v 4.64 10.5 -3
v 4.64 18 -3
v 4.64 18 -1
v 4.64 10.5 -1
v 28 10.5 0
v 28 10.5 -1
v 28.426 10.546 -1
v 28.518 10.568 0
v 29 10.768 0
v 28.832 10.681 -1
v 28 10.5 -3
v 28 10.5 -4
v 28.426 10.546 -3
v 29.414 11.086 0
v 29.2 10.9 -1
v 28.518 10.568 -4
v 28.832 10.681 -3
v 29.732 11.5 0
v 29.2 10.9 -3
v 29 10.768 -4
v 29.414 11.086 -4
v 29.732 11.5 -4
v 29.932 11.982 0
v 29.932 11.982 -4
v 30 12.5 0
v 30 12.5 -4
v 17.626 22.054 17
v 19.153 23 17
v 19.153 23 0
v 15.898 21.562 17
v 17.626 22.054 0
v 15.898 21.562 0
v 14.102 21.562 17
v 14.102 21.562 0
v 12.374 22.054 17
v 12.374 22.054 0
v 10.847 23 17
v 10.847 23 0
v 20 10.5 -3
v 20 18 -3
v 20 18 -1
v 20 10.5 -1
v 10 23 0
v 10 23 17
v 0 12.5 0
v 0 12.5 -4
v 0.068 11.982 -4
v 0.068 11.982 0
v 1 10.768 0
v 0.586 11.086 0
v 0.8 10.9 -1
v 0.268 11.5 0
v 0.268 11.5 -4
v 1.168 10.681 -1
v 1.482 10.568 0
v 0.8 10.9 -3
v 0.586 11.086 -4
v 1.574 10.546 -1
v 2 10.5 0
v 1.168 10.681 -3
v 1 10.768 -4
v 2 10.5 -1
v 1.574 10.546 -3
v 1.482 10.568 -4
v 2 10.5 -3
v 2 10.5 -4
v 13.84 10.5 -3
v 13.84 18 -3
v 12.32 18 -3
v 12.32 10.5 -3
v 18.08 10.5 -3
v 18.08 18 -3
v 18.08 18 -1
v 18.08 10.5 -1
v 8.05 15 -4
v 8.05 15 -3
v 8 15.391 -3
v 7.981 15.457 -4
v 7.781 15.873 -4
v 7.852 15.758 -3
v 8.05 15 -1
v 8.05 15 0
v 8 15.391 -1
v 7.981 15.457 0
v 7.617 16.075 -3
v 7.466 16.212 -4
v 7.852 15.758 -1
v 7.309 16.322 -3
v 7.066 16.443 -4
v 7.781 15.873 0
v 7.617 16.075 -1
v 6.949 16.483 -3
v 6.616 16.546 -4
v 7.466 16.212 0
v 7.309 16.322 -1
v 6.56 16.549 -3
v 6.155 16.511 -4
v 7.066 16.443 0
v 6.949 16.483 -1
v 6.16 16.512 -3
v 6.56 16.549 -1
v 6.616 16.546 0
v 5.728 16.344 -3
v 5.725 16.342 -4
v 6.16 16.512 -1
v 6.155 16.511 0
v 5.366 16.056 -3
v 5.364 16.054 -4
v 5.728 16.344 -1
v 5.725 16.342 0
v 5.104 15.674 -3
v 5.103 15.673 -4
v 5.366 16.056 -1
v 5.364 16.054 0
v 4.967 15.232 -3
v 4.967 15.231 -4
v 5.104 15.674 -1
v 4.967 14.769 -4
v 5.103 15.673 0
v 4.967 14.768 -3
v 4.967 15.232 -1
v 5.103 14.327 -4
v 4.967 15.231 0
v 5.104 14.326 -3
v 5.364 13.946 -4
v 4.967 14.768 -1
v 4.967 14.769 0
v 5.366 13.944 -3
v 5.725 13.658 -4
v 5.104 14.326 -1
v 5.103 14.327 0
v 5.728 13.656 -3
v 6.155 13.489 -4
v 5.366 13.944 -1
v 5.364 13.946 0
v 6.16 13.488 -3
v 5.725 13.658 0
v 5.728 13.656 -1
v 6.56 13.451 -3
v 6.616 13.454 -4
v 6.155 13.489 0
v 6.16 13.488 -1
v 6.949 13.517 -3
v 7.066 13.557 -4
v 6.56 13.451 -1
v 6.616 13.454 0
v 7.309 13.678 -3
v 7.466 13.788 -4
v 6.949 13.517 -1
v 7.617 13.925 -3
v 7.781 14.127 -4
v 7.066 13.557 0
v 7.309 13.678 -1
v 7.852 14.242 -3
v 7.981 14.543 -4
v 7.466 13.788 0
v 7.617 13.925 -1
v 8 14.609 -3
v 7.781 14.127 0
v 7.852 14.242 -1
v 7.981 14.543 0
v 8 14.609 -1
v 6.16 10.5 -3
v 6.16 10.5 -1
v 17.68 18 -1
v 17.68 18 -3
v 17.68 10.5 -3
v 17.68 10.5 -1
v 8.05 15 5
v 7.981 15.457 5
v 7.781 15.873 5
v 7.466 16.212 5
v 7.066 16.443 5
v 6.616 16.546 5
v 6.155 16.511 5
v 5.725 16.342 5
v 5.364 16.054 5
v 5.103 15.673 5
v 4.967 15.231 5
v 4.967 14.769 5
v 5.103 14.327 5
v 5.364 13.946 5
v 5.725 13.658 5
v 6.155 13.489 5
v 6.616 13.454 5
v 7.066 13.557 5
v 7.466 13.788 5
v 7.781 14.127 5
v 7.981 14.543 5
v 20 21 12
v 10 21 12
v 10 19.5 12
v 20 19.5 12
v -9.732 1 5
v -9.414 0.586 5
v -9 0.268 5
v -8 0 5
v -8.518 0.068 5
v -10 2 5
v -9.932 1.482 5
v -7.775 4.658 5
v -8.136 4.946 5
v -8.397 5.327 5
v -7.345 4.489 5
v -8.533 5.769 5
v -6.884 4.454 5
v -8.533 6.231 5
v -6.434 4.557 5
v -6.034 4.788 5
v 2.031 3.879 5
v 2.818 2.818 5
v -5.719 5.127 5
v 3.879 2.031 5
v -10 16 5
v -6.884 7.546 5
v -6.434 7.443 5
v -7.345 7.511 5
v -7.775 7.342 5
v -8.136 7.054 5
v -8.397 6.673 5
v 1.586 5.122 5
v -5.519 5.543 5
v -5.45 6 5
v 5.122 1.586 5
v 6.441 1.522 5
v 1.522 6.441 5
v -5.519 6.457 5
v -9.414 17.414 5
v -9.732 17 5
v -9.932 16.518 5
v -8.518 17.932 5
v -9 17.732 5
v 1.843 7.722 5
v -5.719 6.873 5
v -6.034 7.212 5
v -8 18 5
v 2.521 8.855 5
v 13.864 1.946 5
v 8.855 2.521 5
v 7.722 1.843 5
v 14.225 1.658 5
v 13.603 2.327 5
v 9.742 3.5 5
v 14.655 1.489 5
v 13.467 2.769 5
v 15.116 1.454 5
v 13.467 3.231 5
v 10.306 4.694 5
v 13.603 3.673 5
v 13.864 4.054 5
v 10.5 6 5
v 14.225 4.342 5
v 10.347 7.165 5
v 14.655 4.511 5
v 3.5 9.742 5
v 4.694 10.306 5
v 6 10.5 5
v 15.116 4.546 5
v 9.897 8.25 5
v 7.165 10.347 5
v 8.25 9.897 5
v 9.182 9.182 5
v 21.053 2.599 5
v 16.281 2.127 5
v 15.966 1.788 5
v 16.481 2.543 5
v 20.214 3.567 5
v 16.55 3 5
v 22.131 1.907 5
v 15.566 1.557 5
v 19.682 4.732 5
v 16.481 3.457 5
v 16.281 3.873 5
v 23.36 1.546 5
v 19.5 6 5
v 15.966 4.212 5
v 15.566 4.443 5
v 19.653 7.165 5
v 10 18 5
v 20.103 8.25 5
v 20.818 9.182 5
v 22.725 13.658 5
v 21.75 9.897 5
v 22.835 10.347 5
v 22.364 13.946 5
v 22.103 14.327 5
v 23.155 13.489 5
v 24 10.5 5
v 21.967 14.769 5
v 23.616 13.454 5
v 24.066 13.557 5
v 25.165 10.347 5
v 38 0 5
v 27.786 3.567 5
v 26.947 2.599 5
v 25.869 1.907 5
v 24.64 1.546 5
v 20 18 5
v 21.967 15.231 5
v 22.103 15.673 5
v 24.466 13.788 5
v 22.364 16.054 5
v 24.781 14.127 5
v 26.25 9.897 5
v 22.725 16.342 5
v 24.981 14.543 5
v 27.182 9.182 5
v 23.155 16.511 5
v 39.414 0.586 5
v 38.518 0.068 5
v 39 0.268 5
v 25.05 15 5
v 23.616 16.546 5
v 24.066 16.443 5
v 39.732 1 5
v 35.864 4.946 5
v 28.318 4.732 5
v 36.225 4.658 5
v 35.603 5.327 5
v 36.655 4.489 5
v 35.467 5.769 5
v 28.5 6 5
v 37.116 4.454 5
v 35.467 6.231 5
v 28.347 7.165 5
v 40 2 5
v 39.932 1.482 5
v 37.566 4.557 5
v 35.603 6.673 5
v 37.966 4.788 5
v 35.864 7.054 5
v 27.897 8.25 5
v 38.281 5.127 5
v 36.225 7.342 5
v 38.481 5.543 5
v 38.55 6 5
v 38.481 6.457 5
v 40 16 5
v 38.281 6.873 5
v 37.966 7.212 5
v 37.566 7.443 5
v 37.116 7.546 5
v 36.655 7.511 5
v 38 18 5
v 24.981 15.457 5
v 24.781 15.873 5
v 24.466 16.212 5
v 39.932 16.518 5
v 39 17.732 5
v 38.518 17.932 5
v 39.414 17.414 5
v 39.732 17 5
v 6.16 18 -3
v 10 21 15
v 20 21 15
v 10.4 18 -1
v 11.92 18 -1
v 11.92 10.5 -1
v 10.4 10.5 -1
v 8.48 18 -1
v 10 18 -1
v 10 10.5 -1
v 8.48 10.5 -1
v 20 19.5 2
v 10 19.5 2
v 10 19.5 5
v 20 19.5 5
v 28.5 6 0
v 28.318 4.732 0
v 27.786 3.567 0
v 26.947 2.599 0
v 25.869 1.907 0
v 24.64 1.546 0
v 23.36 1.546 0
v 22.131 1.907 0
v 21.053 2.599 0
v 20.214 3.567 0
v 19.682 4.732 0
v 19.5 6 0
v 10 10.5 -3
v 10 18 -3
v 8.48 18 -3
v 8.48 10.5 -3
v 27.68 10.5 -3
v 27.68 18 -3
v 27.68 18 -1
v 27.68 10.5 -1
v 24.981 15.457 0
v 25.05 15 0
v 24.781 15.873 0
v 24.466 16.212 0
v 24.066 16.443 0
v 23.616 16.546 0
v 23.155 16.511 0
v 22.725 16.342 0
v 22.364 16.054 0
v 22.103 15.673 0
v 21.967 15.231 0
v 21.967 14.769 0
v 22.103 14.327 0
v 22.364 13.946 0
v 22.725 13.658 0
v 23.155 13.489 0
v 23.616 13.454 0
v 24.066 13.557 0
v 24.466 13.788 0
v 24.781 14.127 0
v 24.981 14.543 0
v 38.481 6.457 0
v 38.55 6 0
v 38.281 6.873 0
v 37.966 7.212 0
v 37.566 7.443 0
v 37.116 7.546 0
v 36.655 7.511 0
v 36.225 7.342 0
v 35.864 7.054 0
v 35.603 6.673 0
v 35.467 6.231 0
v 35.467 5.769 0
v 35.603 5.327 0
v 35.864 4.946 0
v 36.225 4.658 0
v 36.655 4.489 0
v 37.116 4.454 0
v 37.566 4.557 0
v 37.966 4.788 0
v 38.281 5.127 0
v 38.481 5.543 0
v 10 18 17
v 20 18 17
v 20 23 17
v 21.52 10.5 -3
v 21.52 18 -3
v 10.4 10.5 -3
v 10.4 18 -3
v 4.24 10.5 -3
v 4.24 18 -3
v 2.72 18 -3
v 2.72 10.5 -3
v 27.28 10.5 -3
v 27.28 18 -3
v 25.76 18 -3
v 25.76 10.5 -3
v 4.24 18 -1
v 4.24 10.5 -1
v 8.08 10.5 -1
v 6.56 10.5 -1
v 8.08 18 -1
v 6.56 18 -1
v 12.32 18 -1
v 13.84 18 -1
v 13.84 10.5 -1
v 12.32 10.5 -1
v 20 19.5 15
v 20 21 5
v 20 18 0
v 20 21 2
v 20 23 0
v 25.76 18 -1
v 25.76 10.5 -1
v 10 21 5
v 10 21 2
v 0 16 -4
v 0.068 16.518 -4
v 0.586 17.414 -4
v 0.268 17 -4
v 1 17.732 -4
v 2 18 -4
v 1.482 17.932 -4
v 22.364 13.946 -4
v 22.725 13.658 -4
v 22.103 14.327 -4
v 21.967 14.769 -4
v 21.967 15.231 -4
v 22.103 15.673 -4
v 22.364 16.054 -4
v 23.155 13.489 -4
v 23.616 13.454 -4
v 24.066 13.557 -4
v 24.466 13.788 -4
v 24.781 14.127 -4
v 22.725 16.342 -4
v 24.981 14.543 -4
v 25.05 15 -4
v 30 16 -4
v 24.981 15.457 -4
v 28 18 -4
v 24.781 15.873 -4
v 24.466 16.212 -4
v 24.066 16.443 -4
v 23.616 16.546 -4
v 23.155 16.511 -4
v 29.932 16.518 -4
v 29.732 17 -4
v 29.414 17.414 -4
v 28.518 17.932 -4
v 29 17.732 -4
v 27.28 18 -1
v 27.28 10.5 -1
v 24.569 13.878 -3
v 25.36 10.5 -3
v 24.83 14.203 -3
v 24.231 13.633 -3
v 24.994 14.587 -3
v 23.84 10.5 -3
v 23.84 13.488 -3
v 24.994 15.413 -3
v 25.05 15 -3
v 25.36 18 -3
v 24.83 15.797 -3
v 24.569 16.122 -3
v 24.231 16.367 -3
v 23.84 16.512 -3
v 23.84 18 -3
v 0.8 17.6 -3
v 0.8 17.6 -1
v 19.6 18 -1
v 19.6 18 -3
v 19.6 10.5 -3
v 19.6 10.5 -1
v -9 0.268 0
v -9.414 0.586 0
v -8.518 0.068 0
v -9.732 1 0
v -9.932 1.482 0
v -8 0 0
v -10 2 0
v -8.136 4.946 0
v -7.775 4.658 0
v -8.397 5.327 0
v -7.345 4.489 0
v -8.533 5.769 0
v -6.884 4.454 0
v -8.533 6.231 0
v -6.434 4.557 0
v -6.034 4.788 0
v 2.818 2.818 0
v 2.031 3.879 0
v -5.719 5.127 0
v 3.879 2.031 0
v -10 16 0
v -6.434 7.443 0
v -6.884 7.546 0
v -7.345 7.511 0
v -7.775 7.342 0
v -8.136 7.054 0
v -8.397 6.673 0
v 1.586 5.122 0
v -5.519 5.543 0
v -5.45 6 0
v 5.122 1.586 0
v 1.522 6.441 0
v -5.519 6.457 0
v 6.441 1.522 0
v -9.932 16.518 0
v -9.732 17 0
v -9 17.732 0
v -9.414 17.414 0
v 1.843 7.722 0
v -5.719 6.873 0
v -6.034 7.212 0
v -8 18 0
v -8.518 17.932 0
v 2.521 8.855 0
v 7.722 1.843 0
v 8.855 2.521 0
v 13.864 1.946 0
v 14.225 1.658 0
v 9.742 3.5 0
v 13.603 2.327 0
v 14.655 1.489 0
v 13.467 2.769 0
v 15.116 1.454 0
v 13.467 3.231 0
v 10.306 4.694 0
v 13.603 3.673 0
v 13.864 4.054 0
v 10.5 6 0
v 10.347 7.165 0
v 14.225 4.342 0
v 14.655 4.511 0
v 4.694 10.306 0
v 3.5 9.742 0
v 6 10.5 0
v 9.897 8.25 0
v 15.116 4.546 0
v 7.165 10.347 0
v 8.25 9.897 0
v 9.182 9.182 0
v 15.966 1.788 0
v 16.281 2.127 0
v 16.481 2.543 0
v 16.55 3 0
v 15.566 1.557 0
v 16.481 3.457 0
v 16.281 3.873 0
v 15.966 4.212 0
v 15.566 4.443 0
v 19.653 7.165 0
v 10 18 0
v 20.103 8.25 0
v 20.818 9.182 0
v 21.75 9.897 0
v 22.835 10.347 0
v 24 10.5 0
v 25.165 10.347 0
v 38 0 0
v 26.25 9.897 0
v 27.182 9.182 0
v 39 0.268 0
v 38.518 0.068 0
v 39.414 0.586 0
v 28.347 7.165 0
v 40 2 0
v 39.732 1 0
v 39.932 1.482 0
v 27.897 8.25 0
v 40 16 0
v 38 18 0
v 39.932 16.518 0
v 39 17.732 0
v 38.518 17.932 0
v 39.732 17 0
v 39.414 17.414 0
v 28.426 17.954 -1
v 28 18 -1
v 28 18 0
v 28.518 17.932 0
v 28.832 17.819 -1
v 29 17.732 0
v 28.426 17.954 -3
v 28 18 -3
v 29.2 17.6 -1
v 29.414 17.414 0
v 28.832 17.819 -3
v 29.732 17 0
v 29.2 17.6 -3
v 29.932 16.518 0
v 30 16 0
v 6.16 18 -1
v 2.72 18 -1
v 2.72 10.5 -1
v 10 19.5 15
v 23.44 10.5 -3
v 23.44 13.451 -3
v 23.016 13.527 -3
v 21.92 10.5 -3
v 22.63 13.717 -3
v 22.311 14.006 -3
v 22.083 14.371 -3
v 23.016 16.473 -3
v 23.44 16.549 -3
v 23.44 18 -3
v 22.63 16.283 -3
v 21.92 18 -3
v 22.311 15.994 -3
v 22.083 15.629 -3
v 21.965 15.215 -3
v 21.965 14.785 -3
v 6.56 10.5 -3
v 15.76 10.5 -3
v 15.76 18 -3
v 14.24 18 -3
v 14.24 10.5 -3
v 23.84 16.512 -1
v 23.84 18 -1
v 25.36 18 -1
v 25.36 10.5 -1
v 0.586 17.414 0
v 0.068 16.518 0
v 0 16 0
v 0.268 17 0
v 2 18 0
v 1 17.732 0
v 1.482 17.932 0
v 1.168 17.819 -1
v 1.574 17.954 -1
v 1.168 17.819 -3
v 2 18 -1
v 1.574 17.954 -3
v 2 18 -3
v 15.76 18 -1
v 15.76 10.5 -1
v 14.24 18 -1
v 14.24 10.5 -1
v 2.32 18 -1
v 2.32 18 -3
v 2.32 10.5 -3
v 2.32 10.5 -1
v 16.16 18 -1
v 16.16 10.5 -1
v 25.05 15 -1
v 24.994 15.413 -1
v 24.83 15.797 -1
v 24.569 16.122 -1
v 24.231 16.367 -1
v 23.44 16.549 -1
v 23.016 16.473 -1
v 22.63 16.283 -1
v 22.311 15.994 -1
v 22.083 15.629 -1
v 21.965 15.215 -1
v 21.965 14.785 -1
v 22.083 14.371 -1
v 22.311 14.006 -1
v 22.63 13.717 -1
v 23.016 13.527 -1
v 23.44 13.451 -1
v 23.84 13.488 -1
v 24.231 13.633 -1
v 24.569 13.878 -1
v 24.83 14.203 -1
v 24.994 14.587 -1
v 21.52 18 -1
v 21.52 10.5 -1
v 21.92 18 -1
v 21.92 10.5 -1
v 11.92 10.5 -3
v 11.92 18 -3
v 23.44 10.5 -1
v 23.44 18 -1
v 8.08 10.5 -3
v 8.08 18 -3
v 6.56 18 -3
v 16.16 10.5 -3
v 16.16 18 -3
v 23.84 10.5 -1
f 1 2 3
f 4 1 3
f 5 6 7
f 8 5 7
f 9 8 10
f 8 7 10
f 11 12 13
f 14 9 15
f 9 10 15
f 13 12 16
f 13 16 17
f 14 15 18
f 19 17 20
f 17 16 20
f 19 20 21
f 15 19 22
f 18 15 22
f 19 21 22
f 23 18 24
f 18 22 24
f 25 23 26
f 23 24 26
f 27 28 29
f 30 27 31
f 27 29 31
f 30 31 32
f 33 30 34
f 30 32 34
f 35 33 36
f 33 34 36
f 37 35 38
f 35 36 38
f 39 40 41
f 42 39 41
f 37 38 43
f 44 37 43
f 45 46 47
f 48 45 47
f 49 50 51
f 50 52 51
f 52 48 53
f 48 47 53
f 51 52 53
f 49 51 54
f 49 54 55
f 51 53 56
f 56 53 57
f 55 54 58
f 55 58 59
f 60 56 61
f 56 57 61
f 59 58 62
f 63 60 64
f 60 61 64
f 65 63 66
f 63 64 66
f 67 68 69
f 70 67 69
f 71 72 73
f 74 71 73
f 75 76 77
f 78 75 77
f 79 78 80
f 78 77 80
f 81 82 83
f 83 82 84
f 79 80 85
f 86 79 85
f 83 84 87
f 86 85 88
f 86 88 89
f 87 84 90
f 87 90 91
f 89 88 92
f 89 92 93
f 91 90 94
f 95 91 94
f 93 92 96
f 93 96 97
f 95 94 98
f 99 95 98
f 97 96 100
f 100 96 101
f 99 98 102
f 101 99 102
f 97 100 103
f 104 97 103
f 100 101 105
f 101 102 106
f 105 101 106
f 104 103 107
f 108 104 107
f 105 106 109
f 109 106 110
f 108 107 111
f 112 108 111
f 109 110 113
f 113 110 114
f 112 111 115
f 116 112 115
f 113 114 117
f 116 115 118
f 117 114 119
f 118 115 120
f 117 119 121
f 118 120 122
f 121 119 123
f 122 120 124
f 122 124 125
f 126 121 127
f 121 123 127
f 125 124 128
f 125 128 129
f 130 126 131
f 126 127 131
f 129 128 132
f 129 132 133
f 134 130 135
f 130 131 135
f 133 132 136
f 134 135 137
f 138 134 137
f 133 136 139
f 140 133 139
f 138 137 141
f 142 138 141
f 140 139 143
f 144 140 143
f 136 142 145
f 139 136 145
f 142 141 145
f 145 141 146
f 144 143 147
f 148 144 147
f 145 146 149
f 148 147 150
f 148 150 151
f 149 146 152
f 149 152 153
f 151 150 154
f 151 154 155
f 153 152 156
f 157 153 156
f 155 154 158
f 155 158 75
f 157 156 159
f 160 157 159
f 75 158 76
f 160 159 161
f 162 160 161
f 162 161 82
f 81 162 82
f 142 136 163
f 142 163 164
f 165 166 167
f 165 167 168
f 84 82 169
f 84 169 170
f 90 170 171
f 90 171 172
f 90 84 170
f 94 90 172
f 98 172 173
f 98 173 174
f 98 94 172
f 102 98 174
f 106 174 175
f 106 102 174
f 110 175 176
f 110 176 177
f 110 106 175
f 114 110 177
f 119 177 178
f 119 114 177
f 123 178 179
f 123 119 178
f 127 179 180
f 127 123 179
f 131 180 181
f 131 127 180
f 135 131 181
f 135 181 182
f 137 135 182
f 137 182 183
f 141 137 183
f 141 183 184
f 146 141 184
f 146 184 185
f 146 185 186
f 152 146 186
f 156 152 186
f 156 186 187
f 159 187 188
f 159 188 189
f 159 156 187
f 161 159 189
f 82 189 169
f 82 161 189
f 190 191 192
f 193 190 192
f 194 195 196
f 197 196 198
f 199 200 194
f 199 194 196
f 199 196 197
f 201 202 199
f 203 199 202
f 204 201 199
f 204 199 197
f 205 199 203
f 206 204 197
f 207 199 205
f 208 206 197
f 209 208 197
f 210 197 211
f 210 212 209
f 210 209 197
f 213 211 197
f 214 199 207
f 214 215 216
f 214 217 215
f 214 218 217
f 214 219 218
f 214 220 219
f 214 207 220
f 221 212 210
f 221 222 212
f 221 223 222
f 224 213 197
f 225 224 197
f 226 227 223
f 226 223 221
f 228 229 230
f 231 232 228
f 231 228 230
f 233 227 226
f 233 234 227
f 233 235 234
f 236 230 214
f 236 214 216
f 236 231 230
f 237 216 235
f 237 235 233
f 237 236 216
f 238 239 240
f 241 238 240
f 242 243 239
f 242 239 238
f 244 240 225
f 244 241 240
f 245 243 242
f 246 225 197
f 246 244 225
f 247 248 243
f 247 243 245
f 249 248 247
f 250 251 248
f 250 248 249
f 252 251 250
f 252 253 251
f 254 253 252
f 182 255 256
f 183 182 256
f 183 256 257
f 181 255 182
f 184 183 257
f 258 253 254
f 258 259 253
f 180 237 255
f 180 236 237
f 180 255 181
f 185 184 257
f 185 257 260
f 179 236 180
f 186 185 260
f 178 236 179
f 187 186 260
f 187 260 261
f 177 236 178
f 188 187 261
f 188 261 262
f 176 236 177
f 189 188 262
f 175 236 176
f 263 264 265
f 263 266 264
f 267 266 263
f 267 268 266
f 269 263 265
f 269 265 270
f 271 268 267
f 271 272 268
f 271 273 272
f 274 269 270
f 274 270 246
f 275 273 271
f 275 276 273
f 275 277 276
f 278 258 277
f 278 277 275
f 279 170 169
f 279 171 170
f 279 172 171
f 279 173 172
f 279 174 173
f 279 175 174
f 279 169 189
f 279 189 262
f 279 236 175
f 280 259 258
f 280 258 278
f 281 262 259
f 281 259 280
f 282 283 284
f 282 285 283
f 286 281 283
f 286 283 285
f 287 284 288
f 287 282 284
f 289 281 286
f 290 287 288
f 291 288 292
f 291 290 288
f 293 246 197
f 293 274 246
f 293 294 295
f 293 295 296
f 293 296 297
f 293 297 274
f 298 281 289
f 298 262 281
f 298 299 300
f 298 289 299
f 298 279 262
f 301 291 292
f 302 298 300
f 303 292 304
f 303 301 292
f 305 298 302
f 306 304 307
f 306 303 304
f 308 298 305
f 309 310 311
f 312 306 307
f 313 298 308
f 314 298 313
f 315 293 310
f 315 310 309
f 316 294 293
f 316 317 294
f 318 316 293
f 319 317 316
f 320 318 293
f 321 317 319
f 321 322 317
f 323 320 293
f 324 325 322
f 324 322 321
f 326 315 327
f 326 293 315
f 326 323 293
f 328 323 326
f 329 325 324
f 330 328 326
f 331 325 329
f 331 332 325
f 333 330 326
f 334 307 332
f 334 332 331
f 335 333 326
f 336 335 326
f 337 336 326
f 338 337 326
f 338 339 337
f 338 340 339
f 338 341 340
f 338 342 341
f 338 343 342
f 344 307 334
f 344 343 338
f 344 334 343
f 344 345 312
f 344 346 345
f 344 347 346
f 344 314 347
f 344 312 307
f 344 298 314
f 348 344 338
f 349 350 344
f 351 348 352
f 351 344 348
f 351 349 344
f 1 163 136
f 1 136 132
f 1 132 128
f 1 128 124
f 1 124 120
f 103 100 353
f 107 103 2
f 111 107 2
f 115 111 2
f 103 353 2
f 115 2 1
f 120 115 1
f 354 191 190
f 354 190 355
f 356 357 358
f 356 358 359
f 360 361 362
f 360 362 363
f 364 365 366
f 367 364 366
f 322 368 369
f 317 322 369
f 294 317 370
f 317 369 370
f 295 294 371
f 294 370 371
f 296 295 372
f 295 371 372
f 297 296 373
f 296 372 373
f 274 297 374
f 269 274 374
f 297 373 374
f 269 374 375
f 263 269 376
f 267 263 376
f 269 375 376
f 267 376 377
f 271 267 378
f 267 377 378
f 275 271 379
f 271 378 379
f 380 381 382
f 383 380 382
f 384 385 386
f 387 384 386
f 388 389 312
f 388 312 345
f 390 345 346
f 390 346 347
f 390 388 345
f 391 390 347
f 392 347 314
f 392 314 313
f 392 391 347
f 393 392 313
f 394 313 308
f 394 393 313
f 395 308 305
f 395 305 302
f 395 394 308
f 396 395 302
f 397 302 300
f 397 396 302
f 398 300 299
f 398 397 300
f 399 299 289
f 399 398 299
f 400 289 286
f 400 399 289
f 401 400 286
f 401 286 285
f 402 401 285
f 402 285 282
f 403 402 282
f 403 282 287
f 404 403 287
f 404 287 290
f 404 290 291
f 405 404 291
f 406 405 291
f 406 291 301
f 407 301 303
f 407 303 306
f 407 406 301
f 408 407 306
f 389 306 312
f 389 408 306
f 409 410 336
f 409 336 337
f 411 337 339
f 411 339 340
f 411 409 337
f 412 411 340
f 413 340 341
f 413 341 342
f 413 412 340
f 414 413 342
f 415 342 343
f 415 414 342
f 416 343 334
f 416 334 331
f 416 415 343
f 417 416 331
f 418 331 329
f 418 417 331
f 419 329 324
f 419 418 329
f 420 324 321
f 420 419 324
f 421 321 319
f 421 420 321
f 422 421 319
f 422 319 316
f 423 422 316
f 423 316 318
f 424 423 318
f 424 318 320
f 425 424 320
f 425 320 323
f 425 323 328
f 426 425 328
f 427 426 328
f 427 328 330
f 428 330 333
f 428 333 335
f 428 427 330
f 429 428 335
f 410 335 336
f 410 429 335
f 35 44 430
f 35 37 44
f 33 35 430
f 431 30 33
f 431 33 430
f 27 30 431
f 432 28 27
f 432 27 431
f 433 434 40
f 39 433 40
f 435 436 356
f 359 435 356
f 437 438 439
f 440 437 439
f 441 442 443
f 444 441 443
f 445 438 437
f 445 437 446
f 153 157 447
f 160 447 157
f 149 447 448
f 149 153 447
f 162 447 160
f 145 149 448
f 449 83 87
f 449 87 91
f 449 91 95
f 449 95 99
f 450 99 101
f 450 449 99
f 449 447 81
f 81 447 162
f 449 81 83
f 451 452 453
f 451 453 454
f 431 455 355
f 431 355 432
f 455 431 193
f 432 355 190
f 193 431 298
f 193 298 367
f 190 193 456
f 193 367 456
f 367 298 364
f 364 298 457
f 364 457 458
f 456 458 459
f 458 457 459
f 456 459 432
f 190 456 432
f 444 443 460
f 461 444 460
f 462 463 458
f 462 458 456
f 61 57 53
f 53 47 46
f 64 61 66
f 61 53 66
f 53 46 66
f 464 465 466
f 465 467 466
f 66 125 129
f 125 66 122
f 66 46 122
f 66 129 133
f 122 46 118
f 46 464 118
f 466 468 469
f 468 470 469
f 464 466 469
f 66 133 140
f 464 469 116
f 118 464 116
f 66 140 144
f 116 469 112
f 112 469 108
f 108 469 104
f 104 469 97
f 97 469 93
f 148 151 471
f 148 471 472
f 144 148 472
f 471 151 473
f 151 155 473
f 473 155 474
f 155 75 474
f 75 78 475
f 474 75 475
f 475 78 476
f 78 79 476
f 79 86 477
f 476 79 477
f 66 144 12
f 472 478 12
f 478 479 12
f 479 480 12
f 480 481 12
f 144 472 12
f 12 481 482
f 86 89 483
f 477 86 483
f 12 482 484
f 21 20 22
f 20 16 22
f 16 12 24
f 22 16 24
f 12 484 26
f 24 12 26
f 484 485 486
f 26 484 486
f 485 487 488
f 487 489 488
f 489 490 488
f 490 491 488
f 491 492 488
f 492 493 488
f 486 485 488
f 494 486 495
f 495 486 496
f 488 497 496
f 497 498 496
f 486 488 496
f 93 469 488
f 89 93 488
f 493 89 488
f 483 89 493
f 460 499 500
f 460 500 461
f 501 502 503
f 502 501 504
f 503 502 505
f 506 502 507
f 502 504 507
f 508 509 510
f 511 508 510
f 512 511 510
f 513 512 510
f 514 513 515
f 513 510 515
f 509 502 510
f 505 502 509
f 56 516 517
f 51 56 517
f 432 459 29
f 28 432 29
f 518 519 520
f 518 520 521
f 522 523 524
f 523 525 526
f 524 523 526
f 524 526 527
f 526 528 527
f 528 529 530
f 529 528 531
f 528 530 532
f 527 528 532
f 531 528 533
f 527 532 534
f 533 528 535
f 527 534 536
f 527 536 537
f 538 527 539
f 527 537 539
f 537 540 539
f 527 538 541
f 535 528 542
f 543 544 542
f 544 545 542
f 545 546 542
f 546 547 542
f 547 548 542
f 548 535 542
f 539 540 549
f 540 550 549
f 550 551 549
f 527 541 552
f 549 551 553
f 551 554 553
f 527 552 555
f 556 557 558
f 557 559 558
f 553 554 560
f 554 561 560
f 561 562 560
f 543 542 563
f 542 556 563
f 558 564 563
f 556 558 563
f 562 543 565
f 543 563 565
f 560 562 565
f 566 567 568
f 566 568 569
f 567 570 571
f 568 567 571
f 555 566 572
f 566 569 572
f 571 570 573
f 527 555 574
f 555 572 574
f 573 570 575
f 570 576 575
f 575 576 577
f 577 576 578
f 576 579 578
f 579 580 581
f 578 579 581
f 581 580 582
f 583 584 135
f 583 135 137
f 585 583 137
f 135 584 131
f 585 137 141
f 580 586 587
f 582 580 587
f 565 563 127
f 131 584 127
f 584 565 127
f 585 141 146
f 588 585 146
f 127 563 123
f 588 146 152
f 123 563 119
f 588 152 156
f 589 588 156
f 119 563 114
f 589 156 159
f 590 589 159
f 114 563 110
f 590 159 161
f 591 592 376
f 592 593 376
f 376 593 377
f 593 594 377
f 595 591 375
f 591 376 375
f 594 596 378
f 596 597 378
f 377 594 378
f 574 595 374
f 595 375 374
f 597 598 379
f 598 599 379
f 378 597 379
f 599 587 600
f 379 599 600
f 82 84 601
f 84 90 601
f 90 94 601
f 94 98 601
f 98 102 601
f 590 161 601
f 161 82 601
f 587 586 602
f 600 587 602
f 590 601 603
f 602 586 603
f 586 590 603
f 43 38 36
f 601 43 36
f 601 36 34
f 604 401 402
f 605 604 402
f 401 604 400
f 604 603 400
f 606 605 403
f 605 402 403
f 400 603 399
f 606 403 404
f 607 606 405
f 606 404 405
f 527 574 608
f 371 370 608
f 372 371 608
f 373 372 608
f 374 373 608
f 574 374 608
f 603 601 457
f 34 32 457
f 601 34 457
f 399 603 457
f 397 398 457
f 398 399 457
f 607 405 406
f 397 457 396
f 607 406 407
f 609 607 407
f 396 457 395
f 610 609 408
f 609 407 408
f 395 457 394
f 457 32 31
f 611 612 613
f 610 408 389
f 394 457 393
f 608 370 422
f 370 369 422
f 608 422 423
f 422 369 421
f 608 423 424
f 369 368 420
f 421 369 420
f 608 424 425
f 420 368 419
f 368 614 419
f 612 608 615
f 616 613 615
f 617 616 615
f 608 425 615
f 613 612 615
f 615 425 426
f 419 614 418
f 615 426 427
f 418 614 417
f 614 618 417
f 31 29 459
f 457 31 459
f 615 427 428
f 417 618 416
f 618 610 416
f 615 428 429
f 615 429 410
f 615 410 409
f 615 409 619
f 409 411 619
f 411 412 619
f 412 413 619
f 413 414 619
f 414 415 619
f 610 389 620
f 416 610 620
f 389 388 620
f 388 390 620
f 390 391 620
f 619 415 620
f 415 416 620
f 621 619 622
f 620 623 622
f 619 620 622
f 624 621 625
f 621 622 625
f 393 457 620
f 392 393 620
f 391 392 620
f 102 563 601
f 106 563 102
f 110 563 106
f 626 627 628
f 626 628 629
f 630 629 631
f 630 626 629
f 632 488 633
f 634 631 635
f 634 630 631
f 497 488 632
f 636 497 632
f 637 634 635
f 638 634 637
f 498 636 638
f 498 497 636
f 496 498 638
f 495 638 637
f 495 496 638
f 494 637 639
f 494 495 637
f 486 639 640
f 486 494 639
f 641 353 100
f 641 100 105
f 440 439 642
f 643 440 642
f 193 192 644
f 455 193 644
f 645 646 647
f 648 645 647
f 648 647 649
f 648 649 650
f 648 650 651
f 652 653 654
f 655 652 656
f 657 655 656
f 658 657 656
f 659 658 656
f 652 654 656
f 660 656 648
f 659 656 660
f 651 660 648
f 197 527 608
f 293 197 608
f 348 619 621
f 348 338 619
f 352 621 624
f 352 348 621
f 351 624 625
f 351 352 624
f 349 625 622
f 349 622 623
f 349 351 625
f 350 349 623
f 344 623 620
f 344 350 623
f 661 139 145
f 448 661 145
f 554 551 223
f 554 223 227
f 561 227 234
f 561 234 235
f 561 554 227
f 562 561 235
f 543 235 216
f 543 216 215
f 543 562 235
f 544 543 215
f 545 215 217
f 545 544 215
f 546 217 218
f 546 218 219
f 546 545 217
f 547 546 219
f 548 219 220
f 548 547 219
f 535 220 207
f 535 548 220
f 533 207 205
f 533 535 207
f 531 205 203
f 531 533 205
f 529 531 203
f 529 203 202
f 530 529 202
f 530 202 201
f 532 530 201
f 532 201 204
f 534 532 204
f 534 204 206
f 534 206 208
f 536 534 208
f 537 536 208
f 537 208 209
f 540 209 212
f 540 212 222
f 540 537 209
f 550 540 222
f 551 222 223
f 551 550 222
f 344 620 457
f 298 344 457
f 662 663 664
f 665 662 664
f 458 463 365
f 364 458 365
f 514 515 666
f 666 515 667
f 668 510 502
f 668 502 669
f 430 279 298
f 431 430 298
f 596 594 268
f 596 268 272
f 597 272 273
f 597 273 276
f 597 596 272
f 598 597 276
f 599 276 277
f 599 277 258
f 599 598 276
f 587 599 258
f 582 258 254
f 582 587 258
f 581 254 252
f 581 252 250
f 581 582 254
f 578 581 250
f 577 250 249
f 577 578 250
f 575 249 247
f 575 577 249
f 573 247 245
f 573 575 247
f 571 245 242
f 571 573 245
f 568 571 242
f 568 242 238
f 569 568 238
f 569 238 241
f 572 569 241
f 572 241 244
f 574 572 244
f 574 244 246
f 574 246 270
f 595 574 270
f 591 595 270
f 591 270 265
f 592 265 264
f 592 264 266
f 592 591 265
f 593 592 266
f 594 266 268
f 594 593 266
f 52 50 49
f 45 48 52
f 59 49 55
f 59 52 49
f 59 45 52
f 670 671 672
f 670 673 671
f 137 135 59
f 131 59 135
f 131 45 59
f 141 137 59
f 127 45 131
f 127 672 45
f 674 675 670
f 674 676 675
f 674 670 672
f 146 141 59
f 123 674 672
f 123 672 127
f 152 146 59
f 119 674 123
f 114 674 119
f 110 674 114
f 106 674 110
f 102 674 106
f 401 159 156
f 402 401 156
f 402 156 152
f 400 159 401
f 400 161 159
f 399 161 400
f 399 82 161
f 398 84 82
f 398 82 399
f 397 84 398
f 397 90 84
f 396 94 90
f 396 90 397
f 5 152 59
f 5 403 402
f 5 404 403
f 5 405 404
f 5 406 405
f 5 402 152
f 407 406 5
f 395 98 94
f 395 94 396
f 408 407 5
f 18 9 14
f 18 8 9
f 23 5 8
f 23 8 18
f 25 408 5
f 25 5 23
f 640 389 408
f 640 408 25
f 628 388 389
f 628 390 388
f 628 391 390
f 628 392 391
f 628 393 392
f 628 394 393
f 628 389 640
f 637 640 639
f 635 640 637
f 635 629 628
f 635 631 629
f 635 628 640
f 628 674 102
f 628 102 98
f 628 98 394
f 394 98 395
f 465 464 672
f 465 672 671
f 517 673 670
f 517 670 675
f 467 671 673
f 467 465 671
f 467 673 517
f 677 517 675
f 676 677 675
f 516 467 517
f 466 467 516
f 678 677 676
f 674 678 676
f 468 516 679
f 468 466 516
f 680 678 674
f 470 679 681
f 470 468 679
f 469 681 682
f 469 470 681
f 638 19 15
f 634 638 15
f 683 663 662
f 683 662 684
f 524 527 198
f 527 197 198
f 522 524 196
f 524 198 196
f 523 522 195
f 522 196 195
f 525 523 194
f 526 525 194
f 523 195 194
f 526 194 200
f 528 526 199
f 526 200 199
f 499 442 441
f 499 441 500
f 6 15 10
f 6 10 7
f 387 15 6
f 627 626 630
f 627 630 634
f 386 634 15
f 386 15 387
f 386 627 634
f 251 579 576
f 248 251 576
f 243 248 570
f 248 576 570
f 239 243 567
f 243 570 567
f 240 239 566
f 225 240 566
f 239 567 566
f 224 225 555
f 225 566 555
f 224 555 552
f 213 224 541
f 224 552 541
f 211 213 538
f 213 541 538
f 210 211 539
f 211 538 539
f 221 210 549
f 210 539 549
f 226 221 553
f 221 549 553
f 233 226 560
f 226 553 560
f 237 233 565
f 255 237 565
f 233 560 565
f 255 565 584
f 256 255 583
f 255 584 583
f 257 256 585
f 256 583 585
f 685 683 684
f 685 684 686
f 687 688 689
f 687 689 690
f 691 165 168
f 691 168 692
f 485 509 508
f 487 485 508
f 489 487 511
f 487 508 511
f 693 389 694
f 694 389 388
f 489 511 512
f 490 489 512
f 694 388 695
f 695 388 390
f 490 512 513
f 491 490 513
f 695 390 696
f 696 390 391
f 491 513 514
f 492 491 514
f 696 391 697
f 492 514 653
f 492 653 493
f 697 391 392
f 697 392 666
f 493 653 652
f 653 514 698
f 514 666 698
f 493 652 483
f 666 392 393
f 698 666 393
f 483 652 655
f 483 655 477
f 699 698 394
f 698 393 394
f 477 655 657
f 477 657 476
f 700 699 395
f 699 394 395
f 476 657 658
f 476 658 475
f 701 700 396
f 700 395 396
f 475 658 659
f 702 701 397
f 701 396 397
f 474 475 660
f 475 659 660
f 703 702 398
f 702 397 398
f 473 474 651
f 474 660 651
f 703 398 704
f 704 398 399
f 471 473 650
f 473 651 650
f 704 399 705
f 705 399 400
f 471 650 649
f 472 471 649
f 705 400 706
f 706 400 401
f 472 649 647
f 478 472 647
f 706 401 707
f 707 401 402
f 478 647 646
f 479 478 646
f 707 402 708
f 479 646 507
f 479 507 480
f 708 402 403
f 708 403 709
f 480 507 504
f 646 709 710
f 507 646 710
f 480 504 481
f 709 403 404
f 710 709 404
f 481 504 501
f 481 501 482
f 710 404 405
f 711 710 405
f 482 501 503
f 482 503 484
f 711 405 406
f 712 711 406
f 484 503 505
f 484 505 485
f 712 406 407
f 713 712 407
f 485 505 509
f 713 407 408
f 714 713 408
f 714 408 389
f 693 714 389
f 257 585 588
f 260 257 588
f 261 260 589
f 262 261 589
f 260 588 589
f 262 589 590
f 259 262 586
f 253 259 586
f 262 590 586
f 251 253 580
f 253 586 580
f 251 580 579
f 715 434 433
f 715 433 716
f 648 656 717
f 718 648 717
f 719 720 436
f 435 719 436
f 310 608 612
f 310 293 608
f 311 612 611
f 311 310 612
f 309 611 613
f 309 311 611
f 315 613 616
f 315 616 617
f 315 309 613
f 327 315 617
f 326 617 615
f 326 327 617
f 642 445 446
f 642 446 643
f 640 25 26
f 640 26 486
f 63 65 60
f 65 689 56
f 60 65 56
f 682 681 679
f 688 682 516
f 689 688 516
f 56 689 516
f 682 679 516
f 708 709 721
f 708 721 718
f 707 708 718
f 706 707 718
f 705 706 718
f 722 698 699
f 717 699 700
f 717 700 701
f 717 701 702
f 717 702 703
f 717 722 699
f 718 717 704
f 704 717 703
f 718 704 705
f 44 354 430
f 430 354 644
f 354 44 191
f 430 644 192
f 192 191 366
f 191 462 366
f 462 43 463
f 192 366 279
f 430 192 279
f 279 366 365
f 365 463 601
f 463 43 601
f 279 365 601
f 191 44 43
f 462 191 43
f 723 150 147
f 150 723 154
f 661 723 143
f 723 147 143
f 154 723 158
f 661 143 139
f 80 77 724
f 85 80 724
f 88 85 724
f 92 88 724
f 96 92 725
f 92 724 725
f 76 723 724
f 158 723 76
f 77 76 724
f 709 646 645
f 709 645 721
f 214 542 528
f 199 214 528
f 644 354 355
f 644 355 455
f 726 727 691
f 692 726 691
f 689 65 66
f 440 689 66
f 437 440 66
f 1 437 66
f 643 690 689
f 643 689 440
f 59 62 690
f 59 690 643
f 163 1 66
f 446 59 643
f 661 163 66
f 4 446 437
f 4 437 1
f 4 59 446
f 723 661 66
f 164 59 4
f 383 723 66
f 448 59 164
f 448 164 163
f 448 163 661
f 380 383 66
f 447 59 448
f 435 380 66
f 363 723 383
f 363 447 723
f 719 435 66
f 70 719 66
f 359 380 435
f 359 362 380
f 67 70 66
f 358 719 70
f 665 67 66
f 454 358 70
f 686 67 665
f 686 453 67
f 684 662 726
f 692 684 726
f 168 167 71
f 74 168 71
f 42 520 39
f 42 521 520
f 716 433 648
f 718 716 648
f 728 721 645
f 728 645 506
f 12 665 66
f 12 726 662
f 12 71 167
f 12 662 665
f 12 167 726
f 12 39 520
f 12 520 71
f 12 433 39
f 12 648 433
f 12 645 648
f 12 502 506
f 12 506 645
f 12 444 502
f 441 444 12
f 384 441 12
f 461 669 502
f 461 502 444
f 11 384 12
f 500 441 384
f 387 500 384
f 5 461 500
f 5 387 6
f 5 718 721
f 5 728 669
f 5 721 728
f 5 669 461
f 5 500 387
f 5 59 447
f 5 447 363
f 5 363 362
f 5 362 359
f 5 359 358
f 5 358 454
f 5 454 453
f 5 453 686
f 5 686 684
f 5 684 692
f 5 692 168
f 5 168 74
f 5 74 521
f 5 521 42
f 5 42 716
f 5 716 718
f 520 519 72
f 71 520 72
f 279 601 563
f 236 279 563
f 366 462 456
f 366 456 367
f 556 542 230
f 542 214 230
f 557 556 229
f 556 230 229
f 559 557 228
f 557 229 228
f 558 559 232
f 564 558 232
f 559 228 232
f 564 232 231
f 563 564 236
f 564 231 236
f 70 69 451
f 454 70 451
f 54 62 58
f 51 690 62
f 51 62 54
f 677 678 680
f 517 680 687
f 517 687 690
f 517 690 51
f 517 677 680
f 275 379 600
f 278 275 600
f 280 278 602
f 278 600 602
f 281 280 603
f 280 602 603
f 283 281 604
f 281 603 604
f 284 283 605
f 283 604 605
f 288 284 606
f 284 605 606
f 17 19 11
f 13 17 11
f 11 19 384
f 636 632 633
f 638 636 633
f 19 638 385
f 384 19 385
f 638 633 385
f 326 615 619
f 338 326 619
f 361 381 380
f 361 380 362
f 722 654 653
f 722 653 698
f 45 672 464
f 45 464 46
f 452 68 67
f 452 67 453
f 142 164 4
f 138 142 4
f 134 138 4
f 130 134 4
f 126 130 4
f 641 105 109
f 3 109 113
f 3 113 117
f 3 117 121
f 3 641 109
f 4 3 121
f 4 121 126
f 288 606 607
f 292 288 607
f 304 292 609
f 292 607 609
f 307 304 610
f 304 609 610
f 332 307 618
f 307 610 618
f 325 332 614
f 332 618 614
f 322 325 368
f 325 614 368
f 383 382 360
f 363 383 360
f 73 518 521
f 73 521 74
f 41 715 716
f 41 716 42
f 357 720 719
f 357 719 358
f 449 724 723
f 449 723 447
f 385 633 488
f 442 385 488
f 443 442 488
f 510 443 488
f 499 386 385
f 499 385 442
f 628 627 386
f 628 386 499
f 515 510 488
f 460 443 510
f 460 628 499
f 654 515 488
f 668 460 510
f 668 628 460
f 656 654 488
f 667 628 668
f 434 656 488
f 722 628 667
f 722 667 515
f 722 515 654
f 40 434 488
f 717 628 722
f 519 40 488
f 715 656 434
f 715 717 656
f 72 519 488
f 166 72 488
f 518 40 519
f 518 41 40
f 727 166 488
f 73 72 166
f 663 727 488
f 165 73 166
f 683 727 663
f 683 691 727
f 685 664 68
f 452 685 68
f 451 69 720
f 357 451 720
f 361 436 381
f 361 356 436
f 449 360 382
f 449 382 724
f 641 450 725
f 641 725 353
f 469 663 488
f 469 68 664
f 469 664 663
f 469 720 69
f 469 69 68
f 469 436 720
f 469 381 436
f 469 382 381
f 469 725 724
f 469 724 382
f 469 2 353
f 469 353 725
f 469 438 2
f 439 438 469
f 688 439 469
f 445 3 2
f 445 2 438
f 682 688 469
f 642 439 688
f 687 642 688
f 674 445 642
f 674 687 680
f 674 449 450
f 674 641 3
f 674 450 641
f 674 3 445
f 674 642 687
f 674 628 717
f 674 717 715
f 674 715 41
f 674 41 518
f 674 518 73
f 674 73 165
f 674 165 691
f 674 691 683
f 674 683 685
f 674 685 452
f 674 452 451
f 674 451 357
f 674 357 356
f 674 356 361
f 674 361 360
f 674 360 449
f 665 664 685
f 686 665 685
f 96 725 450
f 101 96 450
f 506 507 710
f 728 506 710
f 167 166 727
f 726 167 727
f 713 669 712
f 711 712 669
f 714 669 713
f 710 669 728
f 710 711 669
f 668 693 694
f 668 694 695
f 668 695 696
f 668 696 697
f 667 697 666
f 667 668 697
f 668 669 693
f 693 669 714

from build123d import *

# Parameters (mm, degrees)
F0_R          = 1.55
F1_DEPTH      = 5
F2_DEPTH      = 4
F3_DEPTH      = 17
F4_W          = 1.5
F4_H          = 3
F5_DEPTH      = 25
F6_W          = 1.52
F6_H          = 2
F7_DEPTH      = 11
F8_F1_R       = 2
F8_F2_R       = 2
F8_F3_R       = 2
F8_F4_R       = 2
F8_2_T1_DEPTH = 14


# Not quite as in the source:
# - a fillet or chamfer that OpenCascade refuses, or shapes differently, is made with other operations: its cross-section is extruded or revolved along the edge and cut away or added
# - a feature names something its author has since deleted; it is built from what else it names


with BuildPart() as f1:
    # F0 (on Top) → F1 (new body)
    with BuildSketch(Plane.XY):
        Polygon((-10, 0), (0, 0), (0, 10.5), (0, 18), (-10, 18), align=None)
        with Locations((-7, 6)):
            Circle(F0_R, mode=Mode.SUBTRACT)
        with BuildLine():
            Line((0, 10.5), (0, 0))
            Line((0, 0), (10.5, 0))
            Line((10.5, 0), (10.5, 6))
            ThreePointArc((10.5, 6), (2.8180194847, 2.8180194847), (6, 10.5))
            Line((6, 10.5), (0, 10.5))
        make_face()
        with BuildLine():
            Line((10.5, 6), (10.5, 0))
            Line((10.5, 0), (19.5, 0))
            Line((19.5, 0), (19.5, 6))
            ThreePointArc((19.5, 6), (20.8180194847, 9.1819805153), (24, 10.5))
            Line((24, 10.5), (6, 10.5))
            ThreePointArc((6, 10.5), (9.1819805153, 9.1819805153), (10.5, 6))
        make_face()
        with Locations((15, 3)):
            Circle(F0_R, mode=Mode.SUBTRACT)
        with BuildLine():
            Line((19.5, 6), (19.5, 0))
            Line((19.5, 0), (30, 0))
            Line((30, 0), (30, 10.5))
            Line((30, 10.5), (24, 10.5))
            ThreePointArc((24, 10.5), (27.1819805153, 9.1819805153), (28.5, 6))
            ThreePointArc((28.5, 6), (24, 1.5), (19.5, 6))
        make_face()
        Polygon((30, 10.5), (30, 0), (40, 0), (40, 18), (30, 18), align=None)
        with Locations((37, 6)):
            Circle(F0_R, mode=Mode.SUBTRACT)
        Polygon((0, 18), (0, 10.5), (6, 10.5), (24, 10.5), (30, 10.5), (30, 18), (20, 18), (10, 18), align=None)
        with Locations((6.5, 15)):
            Circle(F0_R, mode=Mode.SUBTRACT)
        with Locations((23.5, 15)):
            Circle(F0_R, mode=Mode.SUBTRACT)
    extrude(amount=F1_DEPTH)

    # F0 (on Top) → F3 (join)
    with BuildSketch(Plane.XY):
        with BuildLine():
            Line((10, 23), (10, 18))
            Line((10, 18), (20, 18))
            Line((20, 18), (20, 23))
            Line((20, 23), (19.1533119315, 23))
            ThreePointArc((19.1533119315, 23), (15, 21.5), (10.8466880685, 23))
            Line((10.8466880685, 23), (10, 23))
        make_face()
    extrude(amount=F3_DEPTH)

    # F4 (on face) → F5 (cut)
    with BuildSketch(Plane(origin=(10, 0, 0), x_dir=(0, -1, 0), z_dir=(-1, 0, 0))):
        with Locations((-20.25, 3.5)):
            Rectangle(F4_W, F4_H)
        with Locations((-20.25, 13.5)):
            Rectangle(F4_W, F4_H)
    extrude(amount=-F5_DEPTH, mode=Mode.SUBTRACT)

    # F8: fillet of radius 2 on 4 edges, made by hand

    # F8_f1
    f8_f1_edges = [f1.edges().sort_by_distance(p)[0] for p in [
        (40, 0, 2.5),
    ]]
    fillet(f8_f1_edges, radius=F8_F1_R)

    # F8_f2
    f8_f2_edges = [f1.edges().sort_by_distance(p)[0] for p in [
        (40, 18, 2.5),
    ]]
    fillet(f8_f2_edges, radius=F8_F2_R)

    # F8_f3
    f8_f3_edges = [f1.edges().sort_by_distance(p)[0] for p in [
        (-10, 0, 2.5),
    ]]
    fillet(f8_f3_edges, radius=F8_F3_R)

    # F8_f4
    f8_f4_edges = [f1.edges().sort_by_distance(p)[0] for p in [
        (-10, 18, 2.5),
    ]]
    fillet(f8_f4_edges, radius=F8_F4_R)


with BuildPart() as f2:
    # F0 (on Top) → F2 (new body)
    with BuildSketch(Plane.XY):
        Polygon((0, 18), (0, 10.5), (6, 10.5), (24, 10.5), (30, 10.5), (30, 18), (20, 18), (10, 18), align=None)
        with Locations((6.5, 15)):
            Circle(F0_R, mode=Mode.SUBTRACT)
        with Locations((23.5, 15)):
            Circle(F0_R, mode=Mode.SUBTRACT)
    extrude(amount=-F2_DEPTH)

    # F6 (on face) → F7 (cut)
    with BuildSketch(Plane(origin=(0, 18, 0), x_dir=(-1, 0, 0), z_dir=(0, 1, 0))):
        with Locations((-3.48, -2)):
            Rectangle(F6_W, F6_H)
        with Locations((-5.4, -2)):
            Rectangle(F6_W, F6_H)
        with Locations((-7.32, -2)):
            Rectangle(F6_W, F6_H)
        with Locations((-9.24, -2)):
            Rectangle(F6_W, F6_H)
        with Locations((-11.16, -2)):
            Rectangle(F6_W, F6_H)
        with Locations((-13.08, -2)):
            Rectangle(F6_W, F6_H)
        with Locations((-15, -2)):
            Rectangle(F6_W, F6_H)
        with Locations((-16.92, -2)):
            Rectangle(F6_W, F6_H)
        with Locations((-18.84, -2)):
            Rectangle(F6_W, F6_H)
        with Locations((-20.76, -2)):
            Rectangle(F6_W, F6_H)
        with Locations((-22.68, -2)):
            Rectangle(F6_W, F6_H)
        with Locations((-24.6, -2)):
            Rectangle(F6_W, F6_H)
        with Locations((-26.52, -2)):
            Rectangle(F6_W, F6_H)
        with Locations((-28.44, -2)):
            Rectangle(F6_W, F6_H)
        with Locations((-1.56, -2)):
            Rectangle(F6_W, F6_H)
    extrude(amount=-F7_DEPTH, mode=Mode.SUBTRACT)

    # F8#2: fillet of radius 2 on 4 edges, made by hand

    # F8_2_s2 → F8_2_t1 (cut)
    with BuildSketch(Plane.XY.offset(-9)):
        with BuildLine():
            ThreePointArc((0, 16), (0.5857864376, 17.4142135624), (2, 18))
            Line((2, 18), (0, 18))
            Line((0, 18), (0, 16))
        make_face()
        with BuildLine():
            ThreePointArc((28, 18), (29.4142135624, 17.4142135624), (30, 16))
            Line((30, 16), (30, 18))
            Line((30, 18), (28, 18))
        make_face()
        with BuildLine():
            ThreePointArc((28, 10.5), (29.4142135624, 11.0857864376), (30, 12.5))
            Line((30, 12.5), (30, 10.5))
            Line((30, 10.5), (28, 10.5))
        make_face()
        with BuildLine():
            ThreePointArc((0, 12.5), (0.5857864376, 11.0857864376), (2, 10.5))
            Line((2, 10.5), (0, 10.5))
            Line((0, 10.5), (0, 12.5))
        make_face()
    extrude(amount=F8_2_T1_DEPTH, mode=Mode.SUBTRACT)


solid = Compound([f1.part, f2.part])
